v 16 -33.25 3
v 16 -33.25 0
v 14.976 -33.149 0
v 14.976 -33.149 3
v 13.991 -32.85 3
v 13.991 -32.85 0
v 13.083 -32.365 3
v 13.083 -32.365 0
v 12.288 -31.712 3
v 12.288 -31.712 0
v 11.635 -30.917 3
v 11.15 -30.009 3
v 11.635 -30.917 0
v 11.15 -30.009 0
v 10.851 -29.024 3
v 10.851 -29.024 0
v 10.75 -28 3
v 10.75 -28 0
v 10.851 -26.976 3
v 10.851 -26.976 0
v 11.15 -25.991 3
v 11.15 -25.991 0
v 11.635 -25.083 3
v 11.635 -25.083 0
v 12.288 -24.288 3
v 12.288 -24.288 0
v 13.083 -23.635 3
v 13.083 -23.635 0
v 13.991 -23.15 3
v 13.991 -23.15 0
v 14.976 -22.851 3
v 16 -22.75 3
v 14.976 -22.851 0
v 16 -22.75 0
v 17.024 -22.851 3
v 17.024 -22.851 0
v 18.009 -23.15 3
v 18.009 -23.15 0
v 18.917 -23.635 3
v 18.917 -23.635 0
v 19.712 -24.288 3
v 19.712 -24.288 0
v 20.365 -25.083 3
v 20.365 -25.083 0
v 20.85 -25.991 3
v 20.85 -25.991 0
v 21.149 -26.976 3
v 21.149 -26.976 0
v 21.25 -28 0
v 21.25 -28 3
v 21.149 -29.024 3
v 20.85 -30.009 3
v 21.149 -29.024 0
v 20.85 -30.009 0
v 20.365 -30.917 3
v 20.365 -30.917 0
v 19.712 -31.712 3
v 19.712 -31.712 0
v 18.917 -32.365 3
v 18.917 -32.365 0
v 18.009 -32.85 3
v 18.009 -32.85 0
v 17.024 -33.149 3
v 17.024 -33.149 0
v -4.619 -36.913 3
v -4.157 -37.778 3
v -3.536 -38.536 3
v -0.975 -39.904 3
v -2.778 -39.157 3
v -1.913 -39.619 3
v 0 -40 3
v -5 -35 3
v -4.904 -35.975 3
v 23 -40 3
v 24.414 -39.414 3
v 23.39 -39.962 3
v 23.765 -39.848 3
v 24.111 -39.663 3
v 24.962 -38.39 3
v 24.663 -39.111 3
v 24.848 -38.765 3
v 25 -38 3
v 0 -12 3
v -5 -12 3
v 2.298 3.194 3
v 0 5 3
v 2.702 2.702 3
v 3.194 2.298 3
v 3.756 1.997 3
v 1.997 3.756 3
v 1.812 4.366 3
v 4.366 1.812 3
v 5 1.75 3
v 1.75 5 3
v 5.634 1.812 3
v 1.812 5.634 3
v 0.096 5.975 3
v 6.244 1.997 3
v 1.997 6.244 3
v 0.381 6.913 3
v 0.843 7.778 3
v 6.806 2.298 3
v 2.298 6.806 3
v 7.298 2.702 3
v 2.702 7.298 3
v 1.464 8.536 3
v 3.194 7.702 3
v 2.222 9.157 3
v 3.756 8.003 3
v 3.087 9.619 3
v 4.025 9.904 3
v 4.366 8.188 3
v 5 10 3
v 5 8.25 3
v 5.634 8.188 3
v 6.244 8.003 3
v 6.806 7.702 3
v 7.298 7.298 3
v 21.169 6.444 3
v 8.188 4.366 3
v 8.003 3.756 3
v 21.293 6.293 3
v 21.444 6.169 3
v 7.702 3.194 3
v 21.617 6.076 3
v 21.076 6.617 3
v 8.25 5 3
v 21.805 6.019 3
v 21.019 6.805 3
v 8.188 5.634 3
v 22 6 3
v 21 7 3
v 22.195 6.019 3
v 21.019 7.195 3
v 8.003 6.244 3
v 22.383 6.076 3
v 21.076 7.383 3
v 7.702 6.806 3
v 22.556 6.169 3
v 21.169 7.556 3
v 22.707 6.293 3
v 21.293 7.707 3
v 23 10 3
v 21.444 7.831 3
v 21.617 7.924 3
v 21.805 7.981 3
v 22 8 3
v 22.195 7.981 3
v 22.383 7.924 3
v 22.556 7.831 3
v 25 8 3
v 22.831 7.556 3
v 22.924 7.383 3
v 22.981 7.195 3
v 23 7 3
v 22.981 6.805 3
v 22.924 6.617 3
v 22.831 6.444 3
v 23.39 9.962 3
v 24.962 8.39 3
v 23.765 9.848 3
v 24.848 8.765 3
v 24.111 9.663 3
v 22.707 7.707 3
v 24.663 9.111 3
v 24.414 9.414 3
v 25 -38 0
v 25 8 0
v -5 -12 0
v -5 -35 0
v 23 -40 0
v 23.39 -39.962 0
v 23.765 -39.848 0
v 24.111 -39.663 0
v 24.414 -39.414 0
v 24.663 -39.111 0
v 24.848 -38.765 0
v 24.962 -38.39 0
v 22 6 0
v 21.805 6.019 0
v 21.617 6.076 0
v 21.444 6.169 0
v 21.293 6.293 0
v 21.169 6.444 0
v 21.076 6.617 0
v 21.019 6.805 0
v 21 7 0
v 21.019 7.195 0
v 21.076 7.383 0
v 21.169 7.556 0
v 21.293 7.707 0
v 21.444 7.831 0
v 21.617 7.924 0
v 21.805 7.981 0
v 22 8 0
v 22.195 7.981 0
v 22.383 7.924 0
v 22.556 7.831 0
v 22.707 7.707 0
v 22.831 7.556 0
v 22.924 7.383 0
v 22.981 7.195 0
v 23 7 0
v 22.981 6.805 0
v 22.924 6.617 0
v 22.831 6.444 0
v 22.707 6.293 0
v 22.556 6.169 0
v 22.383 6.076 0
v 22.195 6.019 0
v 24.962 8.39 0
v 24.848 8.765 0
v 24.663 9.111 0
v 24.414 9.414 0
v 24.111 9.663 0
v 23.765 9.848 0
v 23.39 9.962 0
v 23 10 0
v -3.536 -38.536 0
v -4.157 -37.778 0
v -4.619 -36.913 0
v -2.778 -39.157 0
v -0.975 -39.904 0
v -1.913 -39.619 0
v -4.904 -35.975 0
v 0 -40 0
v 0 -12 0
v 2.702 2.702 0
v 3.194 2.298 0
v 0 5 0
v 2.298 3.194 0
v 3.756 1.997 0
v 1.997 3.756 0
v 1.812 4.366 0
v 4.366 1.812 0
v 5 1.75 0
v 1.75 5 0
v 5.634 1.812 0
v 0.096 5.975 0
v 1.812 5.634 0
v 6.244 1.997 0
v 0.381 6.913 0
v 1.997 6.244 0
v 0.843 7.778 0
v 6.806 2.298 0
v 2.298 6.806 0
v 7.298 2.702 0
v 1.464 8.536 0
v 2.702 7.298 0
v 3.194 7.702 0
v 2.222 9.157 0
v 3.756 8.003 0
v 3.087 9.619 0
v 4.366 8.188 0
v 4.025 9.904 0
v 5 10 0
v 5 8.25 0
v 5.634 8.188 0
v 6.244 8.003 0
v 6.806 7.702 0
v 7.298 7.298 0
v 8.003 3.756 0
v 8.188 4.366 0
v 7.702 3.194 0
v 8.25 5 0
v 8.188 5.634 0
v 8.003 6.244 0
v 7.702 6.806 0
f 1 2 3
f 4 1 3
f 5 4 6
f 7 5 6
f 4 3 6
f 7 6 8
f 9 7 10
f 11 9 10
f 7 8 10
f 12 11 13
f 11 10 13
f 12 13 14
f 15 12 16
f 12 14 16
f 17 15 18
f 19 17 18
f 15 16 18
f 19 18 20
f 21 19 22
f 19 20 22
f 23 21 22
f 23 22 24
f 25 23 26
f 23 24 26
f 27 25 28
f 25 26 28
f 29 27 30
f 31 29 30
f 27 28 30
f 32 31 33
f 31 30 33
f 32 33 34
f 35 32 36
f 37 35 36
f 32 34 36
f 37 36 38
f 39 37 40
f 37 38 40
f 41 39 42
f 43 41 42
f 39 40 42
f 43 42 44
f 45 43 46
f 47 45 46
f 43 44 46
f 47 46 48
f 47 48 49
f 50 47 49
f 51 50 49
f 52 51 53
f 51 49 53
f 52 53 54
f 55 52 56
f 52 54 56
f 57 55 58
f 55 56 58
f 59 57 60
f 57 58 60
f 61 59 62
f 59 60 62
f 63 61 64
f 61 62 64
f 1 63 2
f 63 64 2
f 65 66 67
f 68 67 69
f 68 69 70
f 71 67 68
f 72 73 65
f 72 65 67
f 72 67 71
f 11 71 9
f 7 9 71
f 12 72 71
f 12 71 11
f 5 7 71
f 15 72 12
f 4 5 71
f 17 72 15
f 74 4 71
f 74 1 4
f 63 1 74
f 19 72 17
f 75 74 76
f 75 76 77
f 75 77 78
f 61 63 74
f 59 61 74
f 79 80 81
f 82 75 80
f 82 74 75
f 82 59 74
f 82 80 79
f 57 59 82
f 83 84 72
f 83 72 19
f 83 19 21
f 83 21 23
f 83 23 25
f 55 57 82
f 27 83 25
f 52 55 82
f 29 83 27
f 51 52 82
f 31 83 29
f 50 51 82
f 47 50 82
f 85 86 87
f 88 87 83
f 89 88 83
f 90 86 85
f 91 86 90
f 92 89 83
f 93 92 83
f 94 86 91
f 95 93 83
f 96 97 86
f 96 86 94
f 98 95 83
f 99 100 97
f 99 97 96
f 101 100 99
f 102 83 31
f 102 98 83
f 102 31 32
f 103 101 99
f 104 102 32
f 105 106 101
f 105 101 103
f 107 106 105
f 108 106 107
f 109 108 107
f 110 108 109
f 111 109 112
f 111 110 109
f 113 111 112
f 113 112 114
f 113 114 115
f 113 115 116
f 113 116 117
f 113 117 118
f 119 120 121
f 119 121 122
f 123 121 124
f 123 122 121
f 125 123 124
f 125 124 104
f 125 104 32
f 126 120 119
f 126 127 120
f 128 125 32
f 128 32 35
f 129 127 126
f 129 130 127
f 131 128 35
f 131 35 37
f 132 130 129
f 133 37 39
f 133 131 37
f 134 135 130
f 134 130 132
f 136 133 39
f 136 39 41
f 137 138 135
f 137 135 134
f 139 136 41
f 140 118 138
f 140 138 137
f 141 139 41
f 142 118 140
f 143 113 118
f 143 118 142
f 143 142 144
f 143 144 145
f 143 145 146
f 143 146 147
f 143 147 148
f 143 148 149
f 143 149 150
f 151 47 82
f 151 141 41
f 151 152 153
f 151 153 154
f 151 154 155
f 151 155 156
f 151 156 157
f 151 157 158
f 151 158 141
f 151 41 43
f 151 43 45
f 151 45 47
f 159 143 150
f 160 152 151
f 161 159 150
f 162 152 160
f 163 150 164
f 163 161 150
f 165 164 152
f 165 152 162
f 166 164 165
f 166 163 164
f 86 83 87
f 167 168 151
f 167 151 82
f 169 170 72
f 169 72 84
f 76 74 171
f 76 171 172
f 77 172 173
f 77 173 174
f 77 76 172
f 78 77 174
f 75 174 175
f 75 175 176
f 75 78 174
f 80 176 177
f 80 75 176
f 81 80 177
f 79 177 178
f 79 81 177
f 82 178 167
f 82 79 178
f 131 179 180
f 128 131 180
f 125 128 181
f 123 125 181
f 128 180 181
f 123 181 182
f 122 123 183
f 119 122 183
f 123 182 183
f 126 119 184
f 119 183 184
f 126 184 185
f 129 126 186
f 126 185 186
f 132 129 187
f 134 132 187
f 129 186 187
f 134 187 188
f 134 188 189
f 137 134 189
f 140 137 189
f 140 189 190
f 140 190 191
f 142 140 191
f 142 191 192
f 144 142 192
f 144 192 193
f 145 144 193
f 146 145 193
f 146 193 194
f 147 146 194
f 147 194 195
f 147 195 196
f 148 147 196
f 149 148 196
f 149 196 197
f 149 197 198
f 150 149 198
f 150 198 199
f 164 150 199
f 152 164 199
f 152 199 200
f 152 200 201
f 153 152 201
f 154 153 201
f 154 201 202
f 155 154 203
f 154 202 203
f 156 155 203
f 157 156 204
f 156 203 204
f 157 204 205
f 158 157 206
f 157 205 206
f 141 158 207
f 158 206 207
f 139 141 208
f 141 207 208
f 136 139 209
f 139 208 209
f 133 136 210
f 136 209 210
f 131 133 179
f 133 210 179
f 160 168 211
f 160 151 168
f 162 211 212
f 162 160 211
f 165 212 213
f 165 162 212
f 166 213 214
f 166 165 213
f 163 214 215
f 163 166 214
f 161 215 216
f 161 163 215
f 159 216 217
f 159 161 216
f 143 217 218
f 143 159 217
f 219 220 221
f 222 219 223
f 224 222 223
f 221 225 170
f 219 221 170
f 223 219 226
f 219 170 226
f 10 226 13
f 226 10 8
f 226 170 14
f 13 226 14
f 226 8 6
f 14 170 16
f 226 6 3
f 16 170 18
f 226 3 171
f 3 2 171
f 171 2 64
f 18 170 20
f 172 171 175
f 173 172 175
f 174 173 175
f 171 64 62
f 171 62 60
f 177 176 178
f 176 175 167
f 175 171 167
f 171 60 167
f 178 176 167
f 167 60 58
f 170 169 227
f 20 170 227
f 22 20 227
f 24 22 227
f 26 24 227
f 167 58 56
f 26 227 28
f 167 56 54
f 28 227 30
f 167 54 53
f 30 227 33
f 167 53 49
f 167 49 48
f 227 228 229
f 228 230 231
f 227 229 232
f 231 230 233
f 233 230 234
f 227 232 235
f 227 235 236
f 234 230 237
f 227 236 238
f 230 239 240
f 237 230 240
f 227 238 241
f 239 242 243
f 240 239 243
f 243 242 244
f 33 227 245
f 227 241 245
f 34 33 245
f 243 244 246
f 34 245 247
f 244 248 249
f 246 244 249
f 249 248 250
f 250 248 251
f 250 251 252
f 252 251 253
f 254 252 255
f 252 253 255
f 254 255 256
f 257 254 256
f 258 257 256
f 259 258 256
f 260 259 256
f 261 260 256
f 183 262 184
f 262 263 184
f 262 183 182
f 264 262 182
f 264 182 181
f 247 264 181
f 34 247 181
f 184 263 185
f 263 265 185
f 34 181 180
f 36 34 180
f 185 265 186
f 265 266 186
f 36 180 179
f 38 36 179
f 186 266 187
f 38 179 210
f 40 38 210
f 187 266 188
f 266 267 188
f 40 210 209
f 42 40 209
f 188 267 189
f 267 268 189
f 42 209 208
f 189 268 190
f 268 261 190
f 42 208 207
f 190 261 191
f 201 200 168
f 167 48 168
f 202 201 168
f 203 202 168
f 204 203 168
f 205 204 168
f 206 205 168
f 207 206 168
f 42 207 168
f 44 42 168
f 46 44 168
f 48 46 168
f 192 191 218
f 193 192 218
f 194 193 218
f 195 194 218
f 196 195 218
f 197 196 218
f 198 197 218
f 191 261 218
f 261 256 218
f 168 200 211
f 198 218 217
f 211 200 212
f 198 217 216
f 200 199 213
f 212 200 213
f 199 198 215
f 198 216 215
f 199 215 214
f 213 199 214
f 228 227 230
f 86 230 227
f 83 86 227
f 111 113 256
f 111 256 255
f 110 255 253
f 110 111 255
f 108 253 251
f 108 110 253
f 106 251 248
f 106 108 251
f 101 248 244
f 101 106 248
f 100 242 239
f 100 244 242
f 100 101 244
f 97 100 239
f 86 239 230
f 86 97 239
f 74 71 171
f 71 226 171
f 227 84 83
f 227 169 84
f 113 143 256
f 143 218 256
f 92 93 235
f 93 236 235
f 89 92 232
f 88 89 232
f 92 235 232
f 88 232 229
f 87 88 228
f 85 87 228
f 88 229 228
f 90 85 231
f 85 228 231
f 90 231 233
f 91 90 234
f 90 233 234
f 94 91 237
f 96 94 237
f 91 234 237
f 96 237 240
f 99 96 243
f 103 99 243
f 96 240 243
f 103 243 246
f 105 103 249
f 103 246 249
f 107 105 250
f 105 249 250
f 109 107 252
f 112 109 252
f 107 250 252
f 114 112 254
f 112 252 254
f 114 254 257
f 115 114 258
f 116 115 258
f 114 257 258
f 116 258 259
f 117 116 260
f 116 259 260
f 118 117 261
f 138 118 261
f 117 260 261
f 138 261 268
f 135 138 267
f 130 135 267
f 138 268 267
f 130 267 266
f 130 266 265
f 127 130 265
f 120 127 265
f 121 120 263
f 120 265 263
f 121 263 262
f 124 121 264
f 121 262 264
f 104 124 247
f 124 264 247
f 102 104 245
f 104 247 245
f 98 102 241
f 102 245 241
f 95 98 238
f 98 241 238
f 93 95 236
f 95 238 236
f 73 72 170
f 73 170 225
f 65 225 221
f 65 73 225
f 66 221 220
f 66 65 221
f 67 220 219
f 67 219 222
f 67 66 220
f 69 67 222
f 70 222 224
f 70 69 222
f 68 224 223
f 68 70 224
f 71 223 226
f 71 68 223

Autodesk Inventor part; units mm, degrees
ref_plane "YZ Plane" through (0, 0, 0) normal (1, 0, 0) x (0, 1, 0)
ref_plane "XZ Plane" through (0, 0, 0) normal (0, 1, 0) x (-1, 0, 0)
ref_plane "XY Plane" through (0, 0, 0) normal (0, 0, 1) x (1, 0, 0)
sketch "Sketch1" plane through (0, 0, 0) normal (0, 0, 1) x (1, 0, 0)
  line L0 (0, 0) -> (10, 0)
  line L1 (10, 0) -> (10, 10)
  line L2 (10, 10) -> (0, 10)
  line L3 (0, 10) -> (0, 0)
  line L4 (10, 10) -> (25, 10)
  line L5 (25, 10) -> (25, 4)
  line L6 (25, 4) -> (10, 4)
  line L7 (10, 4) -> (10, 10)
  line L8 (10, 0) -> (0, 0)
  line L9 (0, 0) -> (0, -40)
  line L10 (0, -40) -> (10, -40)
  line L11 (10, -40) -> (10, 0)
  line L12 (0, -40) -> (-5, -40)
  line L13 (-5, -40) -> (-5, -12)
  line L14 (-5, -12) -> (0, -12)
  line L15 (0, -12) -> (0, -40)
  line L16 (10, 4) -> (25, 4)
  line L17 (25, 4) -> (25, -40)
  line L18 (25, -40) -> (10, -40)
  line L19 (10, -40) -> (10, 4)
  dimension "d0" = 10
  dimension "d2" = 15
  dimension "d3" = 6
  dimension "d5" = 28
  dimension "d6" = 5
  dimension "d7" = 10
  dimension "d30" = 22
extrude "Extrusion1" add sketch "Sketch1" along normal blind 3
fillet "Fillet1" radius 5 1 edges at (0, 10, 1.5)
fillet "Fillet2" radius 5 1 edges at (-5, -40, 1.5)
fillet "Fillet3" [suppressed]
fillet "Fillet4" [suppressed]
sketch "Sketch2" plane through (0, 0, 3) normal (0, 0, 1) x (1, 0, 0)
  arc A0 (22, 4) -> (22, 10) centre (22, 7) ccw projected
  point P0 (0, 0)
hole "Hole1" at (22, 7, 3) direction (0, 0, -1) diameter 2 end through all
sketch "Sketch3" plane through (0, 0, 3) normal (0, 0, 1) x (1, 0, 0)
  line L0 (25, 10) -> (5, 10) projected
  line L1 (0, 5) -> (0, -12) projected
  point P0 (0, 0)
  point P1 (5, 5)
  point P2 (22, 10)
  dimension "d20" = 5
  dimension "d31" = 5
hole "Hole2" at (5, 5, 3) direction (0, 0, -1) diameter 6.5 end through all
fillet "Fillet6" radius 2 2 edges at (25, 10, 1.5) (25, -40, 1.5)
sketch "Sketch4" plane through (0, 0, 3) normal (0, 0, 1) x (1, 0, 0)
  line L0 (25, -38) -> (25, 8) projected
  line L1 (0, -40) -> (23, -40) projected
  point P0 (0, 0)
  point P1 (16, -28)
  dimension "d33" = 9
  dimension "d34" = 12
hole "Hole3" at (16, -28, 3) direction (0, 0, -1) diameter 10.5 end through all
properties part number "Selection_Lever 1" material "Nylon 6/6"
